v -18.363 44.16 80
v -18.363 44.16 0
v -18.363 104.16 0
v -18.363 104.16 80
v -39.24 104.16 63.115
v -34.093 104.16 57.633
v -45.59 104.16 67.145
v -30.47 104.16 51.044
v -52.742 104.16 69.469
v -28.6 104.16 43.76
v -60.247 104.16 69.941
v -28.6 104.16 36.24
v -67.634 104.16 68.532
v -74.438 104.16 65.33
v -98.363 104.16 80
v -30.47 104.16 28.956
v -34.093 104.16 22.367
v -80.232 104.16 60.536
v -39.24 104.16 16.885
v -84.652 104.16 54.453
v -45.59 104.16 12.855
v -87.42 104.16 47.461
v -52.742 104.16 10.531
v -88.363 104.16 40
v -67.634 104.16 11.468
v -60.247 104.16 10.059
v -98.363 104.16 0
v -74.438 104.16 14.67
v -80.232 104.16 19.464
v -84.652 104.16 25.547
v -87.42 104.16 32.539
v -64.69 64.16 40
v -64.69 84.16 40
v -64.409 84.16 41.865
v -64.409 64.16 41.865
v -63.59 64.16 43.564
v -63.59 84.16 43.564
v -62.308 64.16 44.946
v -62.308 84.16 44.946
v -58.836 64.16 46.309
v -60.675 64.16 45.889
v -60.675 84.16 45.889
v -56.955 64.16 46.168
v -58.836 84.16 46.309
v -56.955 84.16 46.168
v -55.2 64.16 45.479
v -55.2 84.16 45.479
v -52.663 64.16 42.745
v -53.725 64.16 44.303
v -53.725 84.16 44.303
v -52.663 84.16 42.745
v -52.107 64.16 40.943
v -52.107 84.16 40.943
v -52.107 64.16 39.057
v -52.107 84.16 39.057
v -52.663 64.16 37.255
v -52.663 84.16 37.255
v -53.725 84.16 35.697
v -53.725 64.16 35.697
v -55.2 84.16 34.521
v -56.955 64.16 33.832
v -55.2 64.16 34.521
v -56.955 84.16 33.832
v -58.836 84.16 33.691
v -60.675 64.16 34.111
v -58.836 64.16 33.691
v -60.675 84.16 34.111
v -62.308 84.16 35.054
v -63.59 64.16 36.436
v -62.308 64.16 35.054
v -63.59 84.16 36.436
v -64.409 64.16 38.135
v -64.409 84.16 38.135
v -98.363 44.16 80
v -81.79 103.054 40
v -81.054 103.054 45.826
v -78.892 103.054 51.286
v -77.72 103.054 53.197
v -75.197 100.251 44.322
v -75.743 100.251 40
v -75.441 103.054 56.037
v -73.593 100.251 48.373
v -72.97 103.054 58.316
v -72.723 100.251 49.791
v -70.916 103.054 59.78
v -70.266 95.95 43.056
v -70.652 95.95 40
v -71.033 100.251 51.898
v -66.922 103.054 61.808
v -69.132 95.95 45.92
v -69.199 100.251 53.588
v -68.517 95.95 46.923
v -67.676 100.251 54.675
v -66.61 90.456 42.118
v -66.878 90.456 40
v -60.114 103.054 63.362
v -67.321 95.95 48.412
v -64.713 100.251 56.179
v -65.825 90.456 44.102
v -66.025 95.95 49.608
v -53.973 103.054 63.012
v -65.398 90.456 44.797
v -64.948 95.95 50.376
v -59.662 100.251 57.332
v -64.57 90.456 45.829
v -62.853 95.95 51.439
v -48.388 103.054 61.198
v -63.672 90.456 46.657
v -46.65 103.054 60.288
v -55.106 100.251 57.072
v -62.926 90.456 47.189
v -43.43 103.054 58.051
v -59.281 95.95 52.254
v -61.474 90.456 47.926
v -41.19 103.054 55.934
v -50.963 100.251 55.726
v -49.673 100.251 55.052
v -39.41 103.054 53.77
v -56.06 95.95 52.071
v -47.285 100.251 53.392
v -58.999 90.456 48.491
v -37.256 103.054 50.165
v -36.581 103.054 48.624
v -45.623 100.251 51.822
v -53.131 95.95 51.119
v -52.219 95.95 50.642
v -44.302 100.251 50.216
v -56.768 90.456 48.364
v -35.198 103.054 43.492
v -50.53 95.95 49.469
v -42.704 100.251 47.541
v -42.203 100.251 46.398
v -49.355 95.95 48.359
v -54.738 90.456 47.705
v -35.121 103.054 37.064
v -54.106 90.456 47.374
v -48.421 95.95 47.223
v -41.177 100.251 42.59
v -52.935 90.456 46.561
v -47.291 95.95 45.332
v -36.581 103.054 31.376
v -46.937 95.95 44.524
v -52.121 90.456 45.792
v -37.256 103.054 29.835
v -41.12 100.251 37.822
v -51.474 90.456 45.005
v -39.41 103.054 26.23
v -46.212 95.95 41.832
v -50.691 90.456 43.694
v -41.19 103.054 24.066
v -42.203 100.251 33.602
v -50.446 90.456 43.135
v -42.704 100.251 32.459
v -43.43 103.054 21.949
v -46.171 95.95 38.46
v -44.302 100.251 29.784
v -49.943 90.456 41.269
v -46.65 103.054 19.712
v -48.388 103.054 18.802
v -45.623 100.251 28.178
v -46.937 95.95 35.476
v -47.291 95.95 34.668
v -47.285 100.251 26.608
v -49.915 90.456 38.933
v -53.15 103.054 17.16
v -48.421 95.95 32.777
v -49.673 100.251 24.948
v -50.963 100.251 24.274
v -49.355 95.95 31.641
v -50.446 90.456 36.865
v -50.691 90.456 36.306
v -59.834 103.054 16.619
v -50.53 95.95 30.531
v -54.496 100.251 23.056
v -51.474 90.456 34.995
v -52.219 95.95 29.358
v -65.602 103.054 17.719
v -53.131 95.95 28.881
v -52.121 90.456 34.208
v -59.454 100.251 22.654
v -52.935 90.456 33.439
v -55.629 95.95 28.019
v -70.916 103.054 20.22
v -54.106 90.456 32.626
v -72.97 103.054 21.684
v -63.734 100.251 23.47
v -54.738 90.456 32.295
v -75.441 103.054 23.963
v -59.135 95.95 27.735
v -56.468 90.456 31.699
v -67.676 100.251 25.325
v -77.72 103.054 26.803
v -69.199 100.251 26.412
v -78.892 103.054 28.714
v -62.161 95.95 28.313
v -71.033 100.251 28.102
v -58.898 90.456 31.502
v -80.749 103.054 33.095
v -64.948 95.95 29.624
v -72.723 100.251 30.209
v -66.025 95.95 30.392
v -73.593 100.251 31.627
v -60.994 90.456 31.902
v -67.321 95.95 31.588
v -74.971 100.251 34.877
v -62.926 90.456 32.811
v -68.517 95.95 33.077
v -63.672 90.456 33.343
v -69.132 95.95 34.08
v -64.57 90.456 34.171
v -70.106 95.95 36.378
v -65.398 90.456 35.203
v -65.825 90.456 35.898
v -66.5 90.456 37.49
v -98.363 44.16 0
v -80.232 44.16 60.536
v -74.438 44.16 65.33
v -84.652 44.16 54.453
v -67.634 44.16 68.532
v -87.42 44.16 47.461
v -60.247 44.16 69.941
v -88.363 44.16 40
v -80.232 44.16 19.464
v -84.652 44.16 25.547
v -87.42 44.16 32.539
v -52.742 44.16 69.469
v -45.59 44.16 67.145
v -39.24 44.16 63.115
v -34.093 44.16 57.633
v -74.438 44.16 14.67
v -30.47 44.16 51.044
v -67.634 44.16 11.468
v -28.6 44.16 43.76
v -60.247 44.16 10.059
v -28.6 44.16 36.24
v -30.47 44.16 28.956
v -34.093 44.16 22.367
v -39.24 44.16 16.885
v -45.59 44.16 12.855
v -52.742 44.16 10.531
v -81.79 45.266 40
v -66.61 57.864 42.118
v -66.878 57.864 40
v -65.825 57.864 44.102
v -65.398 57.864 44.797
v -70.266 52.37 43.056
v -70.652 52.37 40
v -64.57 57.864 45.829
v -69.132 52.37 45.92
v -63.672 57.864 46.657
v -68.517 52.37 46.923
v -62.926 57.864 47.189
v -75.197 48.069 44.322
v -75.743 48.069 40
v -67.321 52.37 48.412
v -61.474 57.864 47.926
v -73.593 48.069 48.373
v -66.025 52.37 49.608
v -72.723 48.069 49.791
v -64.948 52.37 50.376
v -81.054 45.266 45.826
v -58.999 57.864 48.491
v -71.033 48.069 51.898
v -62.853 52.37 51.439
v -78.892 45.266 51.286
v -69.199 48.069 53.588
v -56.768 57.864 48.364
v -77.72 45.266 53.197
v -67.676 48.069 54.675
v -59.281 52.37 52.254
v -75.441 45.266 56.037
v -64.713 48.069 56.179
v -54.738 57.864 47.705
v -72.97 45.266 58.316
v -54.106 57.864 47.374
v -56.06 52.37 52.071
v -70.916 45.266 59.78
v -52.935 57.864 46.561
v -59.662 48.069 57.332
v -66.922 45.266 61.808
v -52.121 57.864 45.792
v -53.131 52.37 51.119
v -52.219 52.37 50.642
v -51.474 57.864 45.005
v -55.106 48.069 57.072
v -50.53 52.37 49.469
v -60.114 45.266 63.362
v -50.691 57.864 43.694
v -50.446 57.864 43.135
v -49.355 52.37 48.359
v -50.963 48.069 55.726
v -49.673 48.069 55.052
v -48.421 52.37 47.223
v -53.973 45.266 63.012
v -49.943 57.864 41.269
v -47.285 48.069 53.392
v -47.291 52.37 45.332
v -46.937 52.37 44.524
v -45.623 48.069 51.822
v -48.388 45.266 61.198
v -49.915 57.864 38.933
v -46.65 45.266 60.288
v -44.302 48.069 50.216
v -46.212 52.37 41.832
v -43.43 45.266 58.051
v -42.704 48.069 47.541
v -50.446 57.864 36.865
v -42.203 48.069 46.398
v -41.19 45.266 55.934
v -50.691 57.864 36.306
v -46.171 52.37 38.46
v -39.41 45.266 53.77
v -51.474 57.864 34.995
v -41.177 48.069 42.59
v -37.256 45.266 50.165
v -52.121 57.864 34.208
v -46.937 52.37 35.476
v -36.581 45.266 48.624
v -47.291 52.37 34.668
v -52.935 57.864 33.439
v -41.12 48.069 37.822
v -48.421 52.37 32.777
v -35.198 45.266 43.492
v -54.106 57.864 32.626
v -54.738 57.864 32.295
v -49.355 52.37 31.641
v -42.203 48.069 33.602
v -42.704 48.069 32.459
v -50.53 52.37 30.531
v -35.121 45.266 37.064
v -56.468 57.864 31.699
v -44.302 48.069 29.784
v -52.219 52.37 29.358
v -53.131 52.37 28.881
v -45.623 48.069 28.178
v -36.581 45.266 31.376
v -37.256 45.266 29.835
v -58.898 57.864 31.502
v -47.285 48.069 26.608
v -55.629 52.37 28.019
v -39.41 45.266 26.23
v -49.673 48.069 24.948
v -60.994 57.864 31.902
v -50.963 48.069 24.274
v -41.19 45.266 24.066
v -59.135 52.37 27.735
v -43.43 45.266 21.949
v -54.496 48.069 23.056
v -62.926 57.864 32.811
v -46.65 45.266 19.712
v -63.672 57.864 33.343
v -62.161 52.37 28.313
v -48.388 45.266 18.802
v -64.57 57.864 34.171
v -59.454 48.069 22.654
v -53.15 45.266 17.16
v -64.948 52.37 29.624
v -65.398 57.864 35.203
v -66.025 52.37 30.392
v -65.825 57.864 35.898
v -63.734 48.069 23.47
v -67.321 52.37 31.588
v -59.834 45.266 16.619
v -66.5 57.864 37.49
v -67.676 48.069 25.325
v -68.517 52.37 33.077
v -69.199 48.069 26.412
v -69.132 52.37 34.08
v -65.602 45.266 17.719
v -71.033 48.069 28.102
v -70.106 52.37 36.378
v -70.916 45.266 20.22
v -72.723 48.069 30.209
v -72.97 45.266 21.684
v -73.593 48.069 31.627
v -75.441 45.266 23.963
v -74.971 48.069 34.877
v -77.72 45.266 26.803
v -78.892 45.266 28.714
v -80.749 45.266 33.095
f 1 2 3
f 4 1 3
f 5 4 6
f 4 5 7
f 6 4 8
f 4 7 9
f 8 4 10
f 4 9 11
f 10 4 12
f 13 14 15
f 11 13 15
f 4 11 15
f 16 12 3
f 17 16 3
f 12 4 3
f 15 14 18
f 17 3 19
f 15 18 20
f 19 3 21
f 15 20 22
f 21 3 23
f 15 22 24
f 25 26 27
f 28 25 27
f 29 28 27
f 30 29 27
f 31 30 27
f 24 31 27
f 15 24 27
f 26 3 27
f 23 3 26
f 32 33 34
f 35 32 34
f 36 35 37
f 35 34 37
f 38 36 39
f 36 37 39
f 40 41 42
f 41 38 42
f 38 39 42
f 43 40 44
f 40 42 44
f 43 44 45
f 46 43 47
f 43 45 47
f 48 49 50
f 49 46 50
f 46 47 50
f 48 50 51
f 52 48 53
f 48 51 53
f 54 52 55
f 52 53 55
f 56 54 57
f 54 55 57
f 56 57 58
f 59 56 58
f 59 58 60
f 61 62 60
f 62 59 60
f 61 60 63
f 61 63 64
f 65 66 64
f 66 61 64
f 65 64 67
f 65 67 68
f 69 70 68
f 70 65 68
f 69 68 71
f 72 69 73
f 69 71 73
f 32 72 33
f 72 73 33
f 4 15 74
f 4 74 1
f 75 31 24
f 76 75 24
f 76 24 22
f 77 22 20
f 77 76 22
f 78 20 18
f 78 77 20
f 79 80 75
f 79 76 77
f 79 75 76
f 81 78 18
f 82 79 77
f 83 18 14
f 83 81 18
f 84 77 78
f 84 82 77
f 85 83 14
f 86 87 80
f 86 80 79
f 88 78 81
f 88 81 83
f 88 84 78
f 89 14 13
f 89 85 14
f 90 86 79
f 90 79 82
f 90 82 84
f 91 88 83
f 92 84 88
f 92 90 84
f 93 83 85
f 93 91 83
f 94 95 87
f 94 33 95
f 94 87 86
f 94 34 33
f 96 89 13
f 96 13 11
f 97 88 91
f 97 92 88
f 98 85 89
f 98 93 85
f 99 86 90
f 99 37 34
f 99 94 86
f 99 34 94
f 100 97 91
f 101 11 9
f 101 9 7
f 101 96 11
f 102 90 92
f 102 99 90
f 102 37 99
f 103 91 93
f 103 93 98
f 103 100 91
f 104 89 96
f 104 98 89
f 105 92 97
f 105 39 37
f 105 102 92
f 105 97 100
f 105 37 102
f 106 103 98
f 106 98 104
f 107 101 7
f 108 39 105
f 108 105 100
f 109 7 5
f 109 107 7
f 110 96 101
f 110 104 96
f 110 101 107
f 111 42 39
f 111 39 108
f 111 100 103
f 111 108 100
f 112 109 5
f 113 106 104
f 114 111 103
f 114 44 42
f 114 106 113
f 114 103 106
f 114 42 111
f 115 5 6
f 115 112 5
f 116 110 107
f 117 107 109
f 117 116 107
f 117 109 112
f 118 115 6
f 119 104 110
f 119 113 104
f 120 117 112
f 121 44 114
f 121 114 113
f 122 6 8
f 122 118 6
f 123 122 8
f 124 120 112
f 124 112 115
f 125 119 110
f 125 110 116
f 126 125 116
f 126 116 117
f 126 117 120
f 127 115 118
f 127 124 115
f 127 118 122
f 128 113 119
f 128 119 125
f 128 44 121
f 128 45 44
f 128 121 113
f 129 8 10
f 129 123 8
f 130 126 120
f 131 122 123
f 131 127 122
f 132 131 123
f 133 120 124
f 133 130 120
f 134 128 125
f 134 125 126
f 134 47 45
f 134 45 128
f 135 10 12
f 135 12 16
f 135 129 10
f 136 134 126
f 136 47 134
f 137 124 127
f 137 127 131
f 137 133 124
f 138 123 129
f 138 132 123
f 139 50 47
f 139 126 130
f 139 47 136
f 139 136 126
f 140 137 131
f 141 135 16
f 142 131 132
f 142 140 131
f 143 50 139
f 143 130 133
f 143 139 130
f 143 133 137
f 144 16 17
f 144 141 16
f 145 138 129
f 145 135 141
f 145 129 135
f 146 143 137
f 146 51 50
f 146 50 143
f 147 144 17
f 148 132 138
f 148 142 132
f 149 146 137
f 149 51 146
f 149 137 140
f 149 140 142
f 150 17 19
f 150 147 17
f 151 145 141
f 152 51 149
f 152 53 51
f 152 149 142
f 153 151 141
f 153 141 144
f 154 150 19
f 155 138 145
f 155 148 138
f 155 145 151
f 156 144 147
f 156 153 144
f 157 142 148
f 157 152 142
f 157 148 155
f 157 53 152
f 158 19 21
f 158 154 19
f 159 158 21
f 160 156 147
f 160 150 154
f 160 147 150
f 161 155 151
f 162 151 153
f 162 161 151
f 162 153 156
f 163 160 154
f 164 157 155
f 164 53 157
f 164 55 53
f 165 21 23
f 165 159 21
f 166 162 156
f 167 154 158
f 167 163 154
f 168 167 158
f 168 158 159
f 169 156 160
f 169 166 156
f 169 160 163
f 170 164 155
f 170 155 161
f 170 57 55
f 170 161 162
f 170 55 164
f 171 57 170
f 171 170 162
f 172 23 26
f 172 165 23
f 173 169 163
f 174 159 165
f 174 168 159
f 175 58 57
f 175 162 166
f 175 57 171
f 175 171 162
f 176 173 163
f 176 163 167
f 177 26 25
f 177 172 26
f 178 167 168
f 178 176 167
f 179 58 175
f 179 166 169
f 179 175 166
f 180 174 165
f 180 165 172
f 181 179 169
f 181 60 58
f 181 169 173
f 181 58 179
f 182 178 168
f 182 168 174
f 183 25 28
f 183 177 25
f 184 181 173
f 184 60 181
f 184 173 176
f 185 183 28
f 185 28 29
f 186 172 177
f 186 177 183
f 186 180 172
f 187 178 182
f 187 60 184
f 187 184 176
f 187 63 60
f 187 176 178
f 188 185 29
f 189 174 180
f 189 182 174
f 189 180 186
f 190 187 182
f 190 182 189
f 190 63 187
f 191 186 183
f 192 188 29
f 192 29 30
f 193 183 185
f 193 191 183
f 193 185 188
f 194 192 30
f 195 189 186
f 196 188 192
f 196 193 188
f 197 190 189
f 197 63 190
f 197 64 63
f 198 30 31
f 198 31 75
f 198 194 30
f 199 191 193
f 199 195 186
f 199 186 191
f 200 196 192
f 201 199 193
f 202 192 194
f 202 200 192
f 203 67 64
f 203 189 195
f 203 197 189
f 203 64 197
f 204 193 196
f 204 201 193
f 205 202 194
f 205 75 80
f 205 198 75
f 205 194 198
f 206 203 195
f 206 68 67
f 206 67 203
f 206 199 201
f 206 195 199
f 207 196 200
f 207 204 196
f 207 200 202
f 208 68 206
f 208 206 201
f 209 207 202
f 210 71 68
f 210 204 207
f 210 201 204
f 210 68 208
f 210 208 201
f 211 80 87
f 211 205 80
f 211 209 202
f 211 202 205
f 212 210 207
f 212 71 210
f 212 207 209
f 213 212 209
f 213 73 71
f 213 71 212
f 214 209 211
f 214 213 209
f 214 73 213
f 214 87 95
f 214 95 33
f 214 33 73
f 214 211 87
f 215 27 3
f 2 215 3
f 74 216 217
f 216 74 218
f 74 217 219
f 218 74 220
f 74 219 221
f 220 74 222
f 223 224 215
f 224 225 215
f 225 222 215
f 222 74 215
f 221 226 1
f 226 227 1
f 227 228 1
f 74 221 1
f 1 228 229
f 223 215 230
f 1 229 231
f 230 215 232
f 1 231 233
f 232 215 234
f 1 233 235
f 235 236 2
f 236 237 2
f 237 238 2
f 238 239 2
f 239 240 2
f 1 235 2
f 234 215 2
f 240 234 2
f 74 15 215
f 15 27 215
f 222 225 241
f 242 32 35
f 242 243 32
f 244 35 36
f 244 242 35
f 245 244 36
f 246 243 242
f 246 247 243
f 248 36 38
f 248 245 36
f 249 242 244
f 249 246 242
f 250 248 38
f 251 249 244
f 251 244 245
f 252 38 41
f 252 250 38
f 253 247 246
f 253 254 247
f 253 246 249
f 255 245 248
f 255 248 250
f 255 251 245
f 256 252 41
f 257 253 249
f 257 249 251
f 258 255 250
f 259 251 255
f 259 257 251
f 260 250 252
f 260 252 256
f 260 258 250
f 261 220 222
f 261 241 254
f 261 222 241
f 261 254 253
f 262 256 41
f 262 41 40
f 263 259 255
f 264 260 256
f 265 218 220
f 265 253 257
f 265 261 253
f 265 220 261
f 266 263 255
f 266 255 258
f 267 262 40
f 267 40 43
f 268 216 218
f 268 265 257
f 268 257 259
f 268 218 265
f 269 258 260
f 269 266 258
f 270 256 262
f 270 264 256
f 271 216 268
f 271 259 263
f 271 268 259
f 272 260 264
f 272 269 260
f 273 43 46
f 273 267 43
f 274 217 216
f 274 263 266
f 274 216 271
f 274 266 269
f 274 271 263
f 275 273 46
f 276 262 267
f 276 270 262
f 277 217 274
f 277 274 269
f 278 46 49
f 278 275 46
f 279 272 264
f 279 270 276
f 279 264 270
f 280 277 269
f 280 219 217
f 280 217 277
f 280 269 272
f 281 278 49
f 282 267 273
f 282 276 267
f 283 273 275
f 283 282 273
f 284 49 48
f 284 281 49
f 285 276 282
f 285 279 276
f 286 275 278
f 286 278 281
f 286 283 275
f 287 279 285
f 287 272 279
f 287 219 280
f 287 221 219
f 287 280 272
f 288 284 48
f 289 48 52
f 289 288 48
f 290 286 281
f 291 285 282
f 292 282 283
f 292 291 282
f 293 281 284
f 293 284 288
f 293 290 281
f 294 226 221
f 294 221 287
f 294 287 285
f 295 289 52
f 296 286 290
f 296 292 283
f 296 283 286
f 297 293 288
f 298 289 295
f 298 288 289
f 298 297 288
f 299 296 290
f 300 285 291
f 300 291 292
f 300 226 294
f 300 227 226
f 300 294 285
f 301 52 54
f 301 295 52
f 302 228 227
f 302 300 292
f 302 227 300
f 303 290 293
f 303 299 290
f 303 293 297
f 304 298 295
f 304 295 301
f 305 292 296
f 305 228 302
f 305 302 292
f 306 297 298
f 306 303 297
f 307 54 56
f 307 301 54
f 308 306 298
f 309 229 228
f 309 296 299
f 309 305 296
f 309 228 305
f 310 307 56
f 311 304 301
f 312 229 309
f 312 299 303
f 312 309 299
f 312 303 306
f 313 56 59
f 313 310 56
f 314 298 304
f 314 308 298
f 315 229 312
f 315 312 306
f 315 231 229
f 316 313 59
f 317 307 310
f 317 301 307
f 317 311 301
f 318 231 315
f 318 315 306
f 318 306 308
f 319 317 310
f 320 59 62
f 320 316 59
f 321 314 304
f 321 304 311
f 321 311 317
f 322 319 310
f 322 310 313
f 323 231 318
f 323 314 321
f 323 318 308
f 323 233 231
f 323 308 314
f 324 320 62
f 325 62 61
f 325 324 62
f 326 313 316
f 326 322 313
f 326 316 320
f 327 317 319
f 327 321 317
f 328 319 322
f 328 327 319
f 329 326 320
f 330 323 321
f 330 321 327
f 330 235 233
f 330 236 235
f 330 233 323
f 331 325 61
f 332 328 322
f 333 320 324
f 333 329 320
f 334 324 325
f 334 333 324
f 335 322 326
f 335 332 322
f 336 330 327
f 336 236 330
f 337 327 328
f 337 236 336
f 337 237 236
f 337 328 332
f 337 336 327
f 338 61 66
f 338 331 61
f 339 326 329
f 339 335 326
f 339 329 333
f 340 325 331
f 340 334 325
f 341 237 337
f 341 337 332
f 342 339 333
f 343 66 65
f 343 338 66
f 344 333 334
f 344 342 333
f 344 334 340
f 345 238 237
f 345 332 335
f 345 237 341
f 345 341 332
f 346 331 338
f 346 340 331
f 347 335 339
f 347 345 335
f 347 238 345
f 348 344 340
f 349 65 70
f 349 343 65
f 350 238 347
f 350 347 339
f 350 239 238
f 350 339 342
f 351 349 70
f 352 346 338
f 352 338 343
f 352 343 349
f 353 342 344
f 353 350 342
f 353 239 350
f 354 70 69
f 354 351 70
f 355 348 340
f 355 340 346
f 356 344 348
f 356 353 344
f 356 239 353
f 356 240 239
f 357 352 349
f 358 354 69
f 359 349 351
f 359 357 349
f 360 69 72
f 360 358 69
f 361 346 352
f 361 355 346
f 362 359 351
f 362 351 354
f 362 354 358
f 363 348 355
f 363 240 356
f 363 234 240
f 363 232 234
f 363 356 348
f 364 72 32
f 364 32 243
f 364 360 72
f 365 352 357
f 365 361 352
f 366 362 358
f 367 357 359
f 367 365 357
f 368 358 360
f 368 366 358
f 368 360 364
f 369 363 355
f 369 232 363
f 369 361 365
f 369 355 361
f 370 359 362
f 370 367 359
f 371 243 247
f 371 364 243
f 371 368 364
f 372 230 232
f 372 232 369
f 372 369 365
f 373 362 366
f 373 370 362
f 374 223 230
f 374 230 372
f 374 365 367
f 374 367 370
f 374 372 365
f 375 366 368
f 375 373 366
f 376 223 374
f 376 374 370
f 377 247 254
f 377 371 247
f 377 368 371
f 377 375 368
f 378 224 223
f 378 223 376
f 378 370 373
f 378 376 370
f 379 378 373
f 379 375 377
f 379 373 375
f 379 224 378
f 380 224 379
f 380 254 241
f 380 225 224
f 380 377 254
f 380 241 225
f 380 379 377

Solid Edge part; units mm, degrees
sketch "Sketch1" plane through (0, 0, 0) normal (0, 0, 1) x (1, 0, 0)
  line L0 (-98.3631, 44.16) -> (-18.3631, 44.16)
  line L1 (-18.3631, 44.16) -> (-18.3631, 104.16)
  line L2 (-18.3631, 104.16) -> (-98.3631, 104.16)
  line L3 (-98.3631, 104.16) -> (-98.3631, 44.16)
  dimension "D1" = 80
  dimension "D2" = 60
extrude "Protrusion1" add sketch "Sketch1" along normal blind 80
sketch "Sketch2" plane through (0, 0, 40) normal (0, 0, 1) x (1, 0, 0)
  arc A0 (-64.6899, 64.16) -> (-88.3631, 44.16) centre (-89.1875, 69.1464) cw
  line L0 (-64.6899, 64.16) -> (-64.6899, 84.16)
  arc A1 (-88.3631, 104.16) -> (-64.6899, 84.16) centre (-89.1875, 79.1736) cw
  dimension "D1" = 30
  dimension "D2" = 25
  dimension "D3" = 25
  dimension "D4" = 20
  dimension "D5" = 20
revolve "RevolvedCutout1" cut sketch "Sketch2" angle 360 about axis through (-58.3631, 104.16, 40) along (0, -1, 0) material side at (-73.0214, 50.0111, 40)
